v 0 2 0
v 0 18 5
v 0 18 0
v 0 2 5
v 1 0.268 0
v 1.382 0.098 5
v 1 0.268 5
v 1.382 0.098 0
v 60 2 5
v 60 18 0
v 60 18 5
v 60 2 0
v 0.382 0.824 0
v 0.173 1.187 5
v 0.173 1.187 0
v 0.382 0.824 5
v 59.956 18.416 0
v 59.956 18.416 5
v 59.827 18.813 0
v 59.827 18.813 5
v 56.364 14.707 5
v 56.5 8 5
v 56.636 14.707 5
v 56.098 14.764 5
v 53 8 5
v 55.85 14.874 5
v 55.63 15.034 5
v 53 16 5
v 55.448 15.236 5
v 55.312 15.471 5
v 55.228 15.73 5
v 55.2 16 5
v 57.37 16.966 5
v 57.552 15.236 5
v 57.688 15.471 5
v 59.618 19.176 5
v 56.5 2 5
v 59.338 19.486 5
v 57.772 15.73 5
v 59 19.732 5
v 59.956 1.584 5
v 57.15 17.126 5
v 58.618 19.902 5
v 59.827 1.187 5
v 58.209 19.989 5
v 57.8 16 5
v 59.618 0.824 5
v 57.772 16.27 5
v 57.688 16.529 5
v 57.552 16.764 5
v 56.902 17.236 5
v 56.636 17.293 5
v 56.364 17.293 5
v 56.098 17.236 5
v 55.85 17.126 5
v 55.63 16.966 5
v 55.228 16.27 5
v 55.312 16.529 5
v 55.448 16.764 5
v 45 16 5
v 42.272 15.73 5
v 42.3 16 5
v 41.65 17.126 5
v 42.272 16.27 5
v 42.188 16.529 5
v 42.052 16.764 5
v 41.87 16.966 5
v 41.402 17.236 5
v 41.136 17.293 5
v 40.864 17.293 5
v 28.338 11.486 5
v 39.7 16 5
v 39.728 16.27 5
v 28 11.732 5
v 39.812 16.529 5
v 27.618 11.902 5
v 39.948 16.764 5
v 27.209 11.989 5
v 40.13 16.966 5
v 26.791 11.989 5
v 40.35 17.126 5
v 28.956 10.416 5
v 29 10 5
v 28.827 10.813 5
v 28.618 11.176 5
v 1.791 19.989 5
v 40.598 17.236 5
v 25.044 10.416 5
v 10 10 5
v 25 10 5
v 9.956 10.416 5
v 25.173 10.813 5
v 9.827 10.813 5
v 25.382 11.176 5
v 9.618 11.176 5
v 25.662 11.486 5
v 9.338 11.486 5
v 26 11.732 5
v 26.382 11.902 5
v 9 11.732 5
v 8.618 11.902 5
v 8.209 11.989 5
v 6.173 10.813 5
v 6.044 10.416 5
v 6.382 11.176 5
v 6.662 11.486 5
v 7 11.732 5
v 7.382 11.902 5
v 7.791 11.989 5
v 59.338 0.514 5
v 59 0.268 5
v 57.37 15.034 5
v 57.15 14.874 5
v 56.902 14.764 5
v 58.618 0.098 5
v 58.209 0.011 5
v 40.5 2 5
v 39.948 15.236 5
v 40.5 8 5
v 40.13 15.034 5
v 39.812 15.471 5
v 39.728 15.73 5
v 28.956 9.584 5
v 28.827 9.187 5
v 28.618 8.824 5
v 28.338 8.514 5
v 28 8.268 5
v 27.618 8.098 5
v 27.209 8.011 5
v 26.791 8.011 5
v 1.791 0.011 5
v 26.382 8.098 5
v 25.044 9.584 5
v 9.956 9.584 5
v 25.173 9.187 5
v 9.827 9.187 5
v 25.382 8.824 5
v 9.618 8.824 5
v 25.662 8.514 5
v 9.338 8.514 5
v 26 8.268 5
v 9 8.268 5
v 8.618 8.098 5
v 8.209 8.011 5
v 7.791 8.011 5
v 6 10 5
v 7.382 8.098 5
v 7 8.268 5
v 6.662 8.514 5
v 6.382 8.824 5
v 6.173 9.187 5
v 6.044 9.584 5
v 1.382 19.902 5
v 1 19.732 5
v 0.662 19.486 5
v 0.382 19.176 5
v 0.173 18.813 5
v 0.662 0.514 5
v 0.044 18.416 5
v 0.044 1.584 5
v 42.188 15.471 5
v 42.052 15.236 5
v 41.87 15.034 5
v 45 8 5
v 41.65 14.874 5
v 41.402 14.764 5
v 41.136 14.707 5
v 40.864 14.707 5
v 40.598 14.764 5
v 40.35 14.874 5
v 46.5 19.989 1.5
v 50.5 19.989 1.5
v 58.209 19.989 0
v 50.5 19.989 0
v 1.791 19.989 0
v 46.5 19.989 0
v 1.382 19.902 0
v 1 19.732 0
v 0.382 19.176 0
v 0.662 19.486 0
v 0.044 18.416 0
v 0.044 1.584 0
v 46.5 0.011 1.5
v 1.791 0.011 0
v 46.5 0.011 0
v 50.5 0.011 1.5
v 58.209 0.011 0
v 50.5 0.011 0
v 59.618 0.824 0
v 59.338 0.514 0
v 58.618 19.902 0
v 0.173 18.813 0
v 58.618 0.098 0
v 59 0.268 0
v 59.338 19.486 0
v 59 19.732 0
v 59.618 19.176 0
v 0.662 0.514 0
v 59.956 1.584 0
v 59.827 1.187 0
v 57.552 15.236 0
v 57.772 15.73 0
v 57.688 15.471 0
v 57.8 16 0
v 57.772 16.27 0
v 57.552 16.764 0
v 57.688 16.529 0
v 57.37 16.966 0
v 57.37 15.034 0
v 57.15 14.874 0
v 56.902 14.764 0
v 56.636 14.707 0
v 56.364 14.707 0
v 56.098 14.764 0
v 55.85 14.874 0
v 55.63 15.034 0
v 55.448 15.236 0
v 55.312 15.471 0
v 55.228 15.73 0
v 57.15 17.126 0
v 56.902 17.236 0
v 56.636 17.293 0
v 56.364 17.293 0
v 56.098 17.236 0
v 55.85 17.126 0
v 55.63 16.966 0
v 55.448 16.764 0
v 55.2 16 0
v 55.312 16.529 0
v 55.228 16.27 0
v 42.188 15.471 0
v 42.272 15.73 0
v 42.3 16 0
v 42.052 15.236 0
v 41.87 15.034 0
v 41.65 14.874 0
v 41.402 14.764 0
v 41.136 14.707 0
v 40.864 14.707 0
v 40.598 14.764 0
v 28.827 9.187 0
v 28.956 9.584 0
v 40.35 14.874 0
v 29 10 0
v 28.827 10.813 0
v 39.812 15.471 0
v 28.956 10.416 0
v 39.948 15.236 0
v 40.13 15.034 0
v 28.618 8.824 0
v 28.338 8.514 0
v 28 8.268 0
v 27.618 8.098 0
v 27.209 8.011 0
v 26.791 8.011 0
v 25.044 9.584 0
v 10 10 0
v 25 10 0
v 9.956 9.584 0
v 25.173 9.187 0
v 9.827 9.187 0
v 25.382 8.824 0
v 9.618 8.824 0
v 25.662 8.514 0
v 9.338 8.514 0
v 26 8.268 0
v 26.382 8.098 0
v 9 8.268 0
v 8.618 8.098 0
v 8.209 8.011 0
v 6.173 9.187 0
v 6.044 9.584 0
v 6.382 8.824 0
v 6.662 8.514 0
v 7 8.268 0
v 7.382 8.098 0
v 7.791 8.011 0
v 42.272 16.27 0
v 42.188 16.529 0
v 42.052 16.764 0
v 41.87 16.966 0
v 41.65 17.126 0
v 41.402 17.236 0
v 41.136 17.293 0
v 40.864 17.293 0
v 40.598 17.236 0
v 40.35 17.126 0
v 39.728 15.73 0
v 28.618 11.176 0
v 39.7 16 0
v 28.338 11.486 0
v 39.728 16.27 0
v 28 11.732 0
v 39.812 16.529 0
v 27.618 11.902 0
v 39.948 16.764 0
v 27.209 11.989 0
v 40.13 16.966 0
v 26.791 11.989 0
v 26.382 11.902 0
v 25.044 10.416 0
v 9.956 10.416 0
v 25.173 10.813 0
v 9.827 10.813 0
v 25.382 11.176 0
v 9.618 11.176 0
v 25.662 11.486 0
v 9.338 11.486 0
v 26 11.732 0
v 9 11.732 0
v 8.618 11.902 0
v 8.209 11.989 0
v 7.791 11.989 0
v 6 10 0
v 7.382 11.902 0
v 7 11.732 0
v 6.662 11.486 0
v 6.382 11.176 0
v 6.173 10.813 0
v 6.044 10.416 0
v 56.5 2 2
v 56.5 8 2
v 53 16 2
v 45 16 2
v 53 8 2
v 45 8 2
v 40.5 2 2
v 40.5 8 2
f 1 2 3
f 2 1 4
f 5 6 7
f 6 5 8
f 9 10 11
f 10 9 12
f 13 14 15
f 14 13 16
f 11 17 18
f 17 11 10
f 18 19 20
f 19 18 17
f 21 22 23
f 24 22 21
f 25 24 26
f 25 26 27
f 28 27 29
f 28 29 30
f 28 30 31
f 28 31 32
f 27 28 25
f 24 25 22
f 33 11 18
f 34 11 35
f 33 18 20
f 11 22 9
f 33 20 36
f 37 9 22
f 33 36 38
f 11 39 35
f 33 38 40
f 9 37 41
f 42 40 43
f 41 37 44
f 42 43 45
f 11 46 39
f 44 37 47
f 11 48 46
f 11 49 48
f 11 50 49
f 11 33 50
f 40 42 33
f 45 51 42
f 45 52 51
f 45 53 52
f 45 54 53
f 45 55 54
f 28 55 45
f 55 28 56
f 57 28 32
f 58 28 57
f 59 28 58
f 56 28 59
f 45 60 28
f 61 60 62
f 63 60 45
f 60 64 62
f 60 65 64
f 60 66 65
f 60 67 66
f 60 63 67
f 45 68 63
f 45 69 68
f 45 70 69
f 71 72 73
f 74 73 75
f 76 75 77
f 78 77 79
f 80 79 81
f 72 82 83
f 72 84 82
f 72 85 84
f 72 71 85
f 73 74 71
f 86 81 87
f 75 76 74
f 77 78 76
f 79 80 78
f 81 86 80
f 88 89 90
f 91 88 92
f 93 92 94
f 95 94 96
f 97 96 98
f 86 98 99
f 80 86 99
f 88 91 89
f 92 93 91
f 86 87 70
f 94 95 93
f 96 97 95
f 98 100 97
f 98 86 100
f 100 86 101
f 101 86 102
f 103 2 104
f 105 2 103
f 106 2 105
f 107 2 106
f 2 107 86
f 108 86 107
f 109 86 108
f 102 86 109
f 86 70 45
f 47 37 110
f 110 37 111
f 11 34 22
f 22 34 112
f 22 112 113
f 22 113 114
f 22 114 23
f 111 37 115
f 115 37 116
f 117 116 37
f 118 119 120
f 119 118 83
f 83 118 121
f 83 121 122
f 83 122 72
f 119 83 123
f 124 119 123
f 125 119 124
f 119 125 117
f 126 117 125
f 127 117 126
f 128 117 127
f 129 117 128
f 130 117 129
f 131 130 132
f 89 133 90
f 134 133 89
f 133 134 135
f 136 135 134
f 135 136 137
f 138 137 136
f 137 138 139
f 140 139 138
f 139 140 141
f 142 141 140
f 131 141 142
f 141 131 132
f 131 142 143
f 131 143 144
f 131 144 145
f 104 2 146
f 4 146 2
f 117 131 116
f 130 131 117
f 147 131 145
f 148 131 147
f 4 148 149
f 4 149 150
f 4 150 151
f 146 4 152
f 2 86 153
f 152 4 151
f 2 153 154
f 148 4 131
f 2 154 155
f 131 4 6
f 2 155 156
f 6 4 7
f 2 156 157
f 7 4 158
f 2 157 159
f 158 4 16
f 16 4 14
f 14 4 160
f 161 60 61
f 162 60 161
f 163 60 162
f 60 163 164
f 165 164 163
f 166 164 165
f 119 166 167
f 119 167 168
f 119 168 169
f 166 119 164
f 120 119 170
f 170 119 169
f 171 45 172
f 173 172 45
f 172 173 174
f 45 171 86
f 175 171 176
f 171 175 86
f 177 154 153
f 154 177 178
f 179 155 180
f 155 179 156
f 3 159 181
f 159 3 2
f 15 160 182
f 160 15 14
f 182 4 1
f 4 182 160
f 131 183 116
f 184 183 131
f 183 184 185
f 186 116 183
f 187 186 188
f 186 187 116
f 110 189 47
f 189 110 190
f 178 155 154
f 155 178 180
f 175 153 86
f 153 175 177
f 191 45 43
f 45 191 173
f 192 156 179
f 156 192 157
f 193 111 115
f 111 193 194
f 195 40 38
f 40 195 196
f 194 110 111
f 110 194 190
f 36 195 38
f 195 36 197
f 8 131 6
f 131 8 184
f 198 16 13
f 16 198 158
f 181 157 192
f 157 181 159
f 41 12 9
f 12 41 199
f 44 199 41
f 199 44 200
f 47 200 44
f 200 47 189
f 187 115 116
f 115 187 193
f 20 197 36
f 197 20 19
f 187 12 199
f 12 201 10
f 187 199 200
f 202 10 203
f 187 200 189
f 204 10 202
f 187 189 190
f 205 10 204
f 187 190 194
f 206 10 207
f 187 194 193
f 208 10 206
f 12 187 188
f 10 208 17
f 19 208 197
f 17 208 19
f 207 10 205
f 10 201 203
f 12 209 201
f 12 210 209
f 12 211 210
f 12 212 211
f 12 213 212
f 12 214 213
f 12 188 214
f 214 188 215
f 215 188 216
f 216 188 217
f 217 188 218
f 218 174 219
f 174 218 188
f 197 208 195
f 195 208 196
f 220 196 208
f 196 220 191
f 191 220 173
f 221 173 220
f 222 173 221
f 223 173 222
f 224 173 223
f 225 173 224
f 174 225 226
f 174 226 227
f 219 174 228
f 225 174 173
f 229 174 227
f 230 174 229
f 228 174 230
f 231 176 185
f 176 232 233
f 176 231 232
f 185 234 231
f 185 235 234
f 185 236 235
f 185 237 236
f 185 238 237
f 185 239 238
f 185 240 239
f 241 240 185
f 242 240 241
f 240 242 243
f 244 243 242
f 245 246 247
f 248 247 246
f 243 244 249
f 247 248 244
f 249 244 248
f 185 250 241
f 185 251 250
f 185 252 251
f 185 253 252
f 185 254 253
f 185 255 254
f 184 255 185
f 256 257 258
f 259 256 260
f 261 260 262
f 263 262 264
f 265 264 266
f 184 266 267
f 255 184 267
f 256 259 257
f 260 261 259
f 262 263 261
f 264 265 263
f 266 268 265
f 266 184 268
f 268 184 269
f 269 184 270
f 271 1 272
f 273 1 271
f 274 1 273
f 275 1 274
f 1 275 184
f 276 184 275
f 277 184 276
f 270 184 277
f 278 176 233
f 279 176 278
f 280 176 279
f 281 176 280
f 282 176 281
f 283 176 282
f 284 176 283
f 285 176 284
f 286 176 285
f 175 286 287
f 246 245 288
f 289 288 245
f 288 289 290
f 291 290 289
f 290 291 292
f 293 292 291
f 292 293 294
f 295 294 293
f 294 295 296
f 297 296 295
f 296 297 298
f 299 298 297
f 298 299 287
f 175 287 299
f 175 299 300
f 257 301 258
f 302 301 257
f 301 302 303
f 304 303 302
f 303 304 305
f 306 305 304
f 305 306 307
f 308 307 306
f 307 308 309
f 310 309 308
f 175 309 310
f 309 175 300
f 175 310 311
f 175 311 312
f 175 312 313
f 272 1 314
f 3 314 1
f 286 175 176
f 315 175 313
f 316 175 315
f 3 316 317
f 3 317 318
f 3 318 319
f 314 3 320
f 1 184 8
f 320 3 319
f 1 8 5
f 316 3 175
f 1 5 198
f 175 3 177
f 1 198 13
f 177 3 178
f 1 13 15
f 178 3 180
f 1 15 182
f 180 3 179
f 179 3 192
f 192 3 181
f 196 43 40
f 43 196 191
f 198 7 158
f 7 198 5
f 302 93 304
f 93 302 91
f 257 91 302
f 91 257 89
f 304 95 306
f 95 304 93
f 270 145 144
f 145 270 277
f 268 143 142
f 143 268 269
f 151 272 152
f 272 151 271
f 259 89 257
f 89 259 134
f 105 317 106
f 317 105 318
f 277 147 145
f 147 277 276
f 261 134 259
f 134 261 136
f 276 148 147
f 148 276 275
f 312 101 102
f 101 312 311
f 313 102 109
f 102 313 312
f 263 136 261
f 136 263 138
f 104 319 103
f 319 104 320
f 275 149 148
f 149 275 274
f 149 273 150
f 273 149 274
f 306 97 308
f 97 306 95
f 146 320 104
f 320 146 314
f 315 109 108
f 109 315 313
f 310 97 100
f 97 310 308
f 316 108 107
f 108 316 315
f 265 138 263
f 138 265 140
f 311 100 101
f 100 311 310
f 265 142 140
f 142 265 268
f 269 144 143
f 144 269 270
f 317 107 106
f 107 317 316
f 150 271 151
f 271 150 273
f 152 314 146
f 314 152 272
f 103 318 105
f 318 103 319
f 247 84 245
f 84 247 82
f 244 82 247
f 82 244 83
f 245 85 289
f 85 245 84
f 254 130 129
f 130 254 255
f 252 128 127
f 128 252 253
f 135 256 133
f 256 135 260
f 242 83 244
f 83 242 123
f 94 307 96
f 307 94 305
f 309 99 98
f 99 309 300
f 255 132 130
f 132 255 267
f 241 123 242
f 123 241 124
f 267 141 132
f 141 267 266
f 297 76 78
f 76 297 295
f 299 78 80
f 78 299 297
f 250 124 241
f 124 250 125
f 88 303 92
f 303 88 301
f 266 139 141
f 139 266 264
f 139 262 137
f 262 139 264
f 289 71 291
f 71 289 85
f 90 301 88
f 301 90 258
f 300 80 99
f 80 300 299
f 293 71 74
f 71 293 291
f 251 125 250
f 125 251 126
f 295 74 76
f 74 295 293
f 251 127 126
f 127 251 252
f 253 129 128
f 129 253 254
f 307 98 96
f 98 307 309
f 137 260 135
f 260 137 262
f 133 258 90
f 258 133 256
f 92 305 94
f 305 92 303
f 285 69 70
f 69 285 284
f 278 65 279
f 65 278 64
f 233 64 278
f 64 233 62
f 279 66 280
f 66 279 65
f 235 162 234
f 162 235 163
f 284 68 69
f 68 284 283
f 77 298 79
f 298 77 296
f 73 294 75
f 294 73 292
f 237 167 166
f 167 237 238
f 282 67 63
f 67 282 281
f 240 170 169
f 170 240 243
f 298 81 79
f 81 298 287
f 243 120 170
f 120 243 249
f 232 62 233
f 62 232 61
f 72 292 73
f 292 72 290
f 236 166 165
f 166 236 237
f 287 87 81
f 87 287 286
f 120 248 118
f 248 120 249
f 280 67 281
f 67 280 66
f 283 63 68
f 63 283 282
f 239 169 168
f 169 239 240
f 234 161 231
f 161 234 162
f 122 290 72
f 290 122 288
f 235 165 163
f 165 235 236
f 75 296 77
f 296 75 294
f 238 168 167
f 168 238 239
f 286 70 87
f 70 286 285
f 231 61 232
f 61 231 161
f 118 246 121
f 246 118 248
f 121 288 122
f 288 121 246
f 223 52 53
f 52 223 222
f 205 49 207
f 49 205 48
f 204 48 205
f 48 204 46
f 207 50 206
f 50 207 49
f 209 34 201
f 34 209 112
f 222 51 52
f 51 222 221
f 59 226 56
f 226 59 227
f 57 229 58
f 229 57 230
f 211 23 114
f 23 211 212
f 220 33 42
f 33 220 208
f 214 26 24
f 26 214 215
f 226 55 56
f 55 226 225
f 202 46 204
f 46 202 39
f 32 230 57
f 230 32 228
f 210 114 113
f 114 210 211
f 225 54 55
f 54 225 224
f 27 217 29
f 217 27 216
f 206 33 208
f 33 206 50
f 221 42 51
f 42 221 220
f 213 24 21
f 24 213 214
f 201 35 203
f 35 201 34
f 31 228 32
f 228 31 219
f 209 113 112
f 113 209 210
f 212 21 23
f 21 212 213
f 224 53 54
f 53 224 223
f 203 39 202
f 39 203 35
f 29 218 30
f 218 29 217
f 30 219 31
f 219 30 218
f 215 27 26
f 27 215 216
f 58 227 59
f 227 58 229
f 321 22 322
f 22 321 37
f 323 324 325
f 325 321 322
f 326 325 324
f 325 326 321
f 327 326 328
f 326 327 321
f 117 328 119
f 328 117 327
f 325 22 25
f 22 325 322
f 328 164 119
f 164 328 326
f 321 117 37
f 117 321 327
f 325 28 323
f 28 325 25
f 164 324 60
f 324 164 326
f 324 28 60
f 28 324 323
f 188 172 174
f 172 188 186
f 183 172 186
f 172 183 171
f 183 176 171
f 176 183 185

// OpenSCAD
$fn=30;

difference() {
  translate([2,2,0])
    minkowski() {
      cube([56,16,2.5]);
      cylinder(r=2,h=2.5);
    }
  
  translate([8,10,-1])
    cylinder(7,d=4);
  translate([27,10,-1])
    cylinder(7,d=4);
  
  translate([41,16,-1])
    cylinder(7,d=2.6);
  translate([56.5,16,-1])
    cylinder(7,d=2.6);
  
  translate([40.5,2,2])
    cube([16,6,4]);
  
  translate([45,2,2])
    cube([8,14,4]);
    
  translate([8,10,-1])
    cylinder(7,d=4);
    
  translate([46.5,0,-1])
      cube([4,20,2.5]);
}
